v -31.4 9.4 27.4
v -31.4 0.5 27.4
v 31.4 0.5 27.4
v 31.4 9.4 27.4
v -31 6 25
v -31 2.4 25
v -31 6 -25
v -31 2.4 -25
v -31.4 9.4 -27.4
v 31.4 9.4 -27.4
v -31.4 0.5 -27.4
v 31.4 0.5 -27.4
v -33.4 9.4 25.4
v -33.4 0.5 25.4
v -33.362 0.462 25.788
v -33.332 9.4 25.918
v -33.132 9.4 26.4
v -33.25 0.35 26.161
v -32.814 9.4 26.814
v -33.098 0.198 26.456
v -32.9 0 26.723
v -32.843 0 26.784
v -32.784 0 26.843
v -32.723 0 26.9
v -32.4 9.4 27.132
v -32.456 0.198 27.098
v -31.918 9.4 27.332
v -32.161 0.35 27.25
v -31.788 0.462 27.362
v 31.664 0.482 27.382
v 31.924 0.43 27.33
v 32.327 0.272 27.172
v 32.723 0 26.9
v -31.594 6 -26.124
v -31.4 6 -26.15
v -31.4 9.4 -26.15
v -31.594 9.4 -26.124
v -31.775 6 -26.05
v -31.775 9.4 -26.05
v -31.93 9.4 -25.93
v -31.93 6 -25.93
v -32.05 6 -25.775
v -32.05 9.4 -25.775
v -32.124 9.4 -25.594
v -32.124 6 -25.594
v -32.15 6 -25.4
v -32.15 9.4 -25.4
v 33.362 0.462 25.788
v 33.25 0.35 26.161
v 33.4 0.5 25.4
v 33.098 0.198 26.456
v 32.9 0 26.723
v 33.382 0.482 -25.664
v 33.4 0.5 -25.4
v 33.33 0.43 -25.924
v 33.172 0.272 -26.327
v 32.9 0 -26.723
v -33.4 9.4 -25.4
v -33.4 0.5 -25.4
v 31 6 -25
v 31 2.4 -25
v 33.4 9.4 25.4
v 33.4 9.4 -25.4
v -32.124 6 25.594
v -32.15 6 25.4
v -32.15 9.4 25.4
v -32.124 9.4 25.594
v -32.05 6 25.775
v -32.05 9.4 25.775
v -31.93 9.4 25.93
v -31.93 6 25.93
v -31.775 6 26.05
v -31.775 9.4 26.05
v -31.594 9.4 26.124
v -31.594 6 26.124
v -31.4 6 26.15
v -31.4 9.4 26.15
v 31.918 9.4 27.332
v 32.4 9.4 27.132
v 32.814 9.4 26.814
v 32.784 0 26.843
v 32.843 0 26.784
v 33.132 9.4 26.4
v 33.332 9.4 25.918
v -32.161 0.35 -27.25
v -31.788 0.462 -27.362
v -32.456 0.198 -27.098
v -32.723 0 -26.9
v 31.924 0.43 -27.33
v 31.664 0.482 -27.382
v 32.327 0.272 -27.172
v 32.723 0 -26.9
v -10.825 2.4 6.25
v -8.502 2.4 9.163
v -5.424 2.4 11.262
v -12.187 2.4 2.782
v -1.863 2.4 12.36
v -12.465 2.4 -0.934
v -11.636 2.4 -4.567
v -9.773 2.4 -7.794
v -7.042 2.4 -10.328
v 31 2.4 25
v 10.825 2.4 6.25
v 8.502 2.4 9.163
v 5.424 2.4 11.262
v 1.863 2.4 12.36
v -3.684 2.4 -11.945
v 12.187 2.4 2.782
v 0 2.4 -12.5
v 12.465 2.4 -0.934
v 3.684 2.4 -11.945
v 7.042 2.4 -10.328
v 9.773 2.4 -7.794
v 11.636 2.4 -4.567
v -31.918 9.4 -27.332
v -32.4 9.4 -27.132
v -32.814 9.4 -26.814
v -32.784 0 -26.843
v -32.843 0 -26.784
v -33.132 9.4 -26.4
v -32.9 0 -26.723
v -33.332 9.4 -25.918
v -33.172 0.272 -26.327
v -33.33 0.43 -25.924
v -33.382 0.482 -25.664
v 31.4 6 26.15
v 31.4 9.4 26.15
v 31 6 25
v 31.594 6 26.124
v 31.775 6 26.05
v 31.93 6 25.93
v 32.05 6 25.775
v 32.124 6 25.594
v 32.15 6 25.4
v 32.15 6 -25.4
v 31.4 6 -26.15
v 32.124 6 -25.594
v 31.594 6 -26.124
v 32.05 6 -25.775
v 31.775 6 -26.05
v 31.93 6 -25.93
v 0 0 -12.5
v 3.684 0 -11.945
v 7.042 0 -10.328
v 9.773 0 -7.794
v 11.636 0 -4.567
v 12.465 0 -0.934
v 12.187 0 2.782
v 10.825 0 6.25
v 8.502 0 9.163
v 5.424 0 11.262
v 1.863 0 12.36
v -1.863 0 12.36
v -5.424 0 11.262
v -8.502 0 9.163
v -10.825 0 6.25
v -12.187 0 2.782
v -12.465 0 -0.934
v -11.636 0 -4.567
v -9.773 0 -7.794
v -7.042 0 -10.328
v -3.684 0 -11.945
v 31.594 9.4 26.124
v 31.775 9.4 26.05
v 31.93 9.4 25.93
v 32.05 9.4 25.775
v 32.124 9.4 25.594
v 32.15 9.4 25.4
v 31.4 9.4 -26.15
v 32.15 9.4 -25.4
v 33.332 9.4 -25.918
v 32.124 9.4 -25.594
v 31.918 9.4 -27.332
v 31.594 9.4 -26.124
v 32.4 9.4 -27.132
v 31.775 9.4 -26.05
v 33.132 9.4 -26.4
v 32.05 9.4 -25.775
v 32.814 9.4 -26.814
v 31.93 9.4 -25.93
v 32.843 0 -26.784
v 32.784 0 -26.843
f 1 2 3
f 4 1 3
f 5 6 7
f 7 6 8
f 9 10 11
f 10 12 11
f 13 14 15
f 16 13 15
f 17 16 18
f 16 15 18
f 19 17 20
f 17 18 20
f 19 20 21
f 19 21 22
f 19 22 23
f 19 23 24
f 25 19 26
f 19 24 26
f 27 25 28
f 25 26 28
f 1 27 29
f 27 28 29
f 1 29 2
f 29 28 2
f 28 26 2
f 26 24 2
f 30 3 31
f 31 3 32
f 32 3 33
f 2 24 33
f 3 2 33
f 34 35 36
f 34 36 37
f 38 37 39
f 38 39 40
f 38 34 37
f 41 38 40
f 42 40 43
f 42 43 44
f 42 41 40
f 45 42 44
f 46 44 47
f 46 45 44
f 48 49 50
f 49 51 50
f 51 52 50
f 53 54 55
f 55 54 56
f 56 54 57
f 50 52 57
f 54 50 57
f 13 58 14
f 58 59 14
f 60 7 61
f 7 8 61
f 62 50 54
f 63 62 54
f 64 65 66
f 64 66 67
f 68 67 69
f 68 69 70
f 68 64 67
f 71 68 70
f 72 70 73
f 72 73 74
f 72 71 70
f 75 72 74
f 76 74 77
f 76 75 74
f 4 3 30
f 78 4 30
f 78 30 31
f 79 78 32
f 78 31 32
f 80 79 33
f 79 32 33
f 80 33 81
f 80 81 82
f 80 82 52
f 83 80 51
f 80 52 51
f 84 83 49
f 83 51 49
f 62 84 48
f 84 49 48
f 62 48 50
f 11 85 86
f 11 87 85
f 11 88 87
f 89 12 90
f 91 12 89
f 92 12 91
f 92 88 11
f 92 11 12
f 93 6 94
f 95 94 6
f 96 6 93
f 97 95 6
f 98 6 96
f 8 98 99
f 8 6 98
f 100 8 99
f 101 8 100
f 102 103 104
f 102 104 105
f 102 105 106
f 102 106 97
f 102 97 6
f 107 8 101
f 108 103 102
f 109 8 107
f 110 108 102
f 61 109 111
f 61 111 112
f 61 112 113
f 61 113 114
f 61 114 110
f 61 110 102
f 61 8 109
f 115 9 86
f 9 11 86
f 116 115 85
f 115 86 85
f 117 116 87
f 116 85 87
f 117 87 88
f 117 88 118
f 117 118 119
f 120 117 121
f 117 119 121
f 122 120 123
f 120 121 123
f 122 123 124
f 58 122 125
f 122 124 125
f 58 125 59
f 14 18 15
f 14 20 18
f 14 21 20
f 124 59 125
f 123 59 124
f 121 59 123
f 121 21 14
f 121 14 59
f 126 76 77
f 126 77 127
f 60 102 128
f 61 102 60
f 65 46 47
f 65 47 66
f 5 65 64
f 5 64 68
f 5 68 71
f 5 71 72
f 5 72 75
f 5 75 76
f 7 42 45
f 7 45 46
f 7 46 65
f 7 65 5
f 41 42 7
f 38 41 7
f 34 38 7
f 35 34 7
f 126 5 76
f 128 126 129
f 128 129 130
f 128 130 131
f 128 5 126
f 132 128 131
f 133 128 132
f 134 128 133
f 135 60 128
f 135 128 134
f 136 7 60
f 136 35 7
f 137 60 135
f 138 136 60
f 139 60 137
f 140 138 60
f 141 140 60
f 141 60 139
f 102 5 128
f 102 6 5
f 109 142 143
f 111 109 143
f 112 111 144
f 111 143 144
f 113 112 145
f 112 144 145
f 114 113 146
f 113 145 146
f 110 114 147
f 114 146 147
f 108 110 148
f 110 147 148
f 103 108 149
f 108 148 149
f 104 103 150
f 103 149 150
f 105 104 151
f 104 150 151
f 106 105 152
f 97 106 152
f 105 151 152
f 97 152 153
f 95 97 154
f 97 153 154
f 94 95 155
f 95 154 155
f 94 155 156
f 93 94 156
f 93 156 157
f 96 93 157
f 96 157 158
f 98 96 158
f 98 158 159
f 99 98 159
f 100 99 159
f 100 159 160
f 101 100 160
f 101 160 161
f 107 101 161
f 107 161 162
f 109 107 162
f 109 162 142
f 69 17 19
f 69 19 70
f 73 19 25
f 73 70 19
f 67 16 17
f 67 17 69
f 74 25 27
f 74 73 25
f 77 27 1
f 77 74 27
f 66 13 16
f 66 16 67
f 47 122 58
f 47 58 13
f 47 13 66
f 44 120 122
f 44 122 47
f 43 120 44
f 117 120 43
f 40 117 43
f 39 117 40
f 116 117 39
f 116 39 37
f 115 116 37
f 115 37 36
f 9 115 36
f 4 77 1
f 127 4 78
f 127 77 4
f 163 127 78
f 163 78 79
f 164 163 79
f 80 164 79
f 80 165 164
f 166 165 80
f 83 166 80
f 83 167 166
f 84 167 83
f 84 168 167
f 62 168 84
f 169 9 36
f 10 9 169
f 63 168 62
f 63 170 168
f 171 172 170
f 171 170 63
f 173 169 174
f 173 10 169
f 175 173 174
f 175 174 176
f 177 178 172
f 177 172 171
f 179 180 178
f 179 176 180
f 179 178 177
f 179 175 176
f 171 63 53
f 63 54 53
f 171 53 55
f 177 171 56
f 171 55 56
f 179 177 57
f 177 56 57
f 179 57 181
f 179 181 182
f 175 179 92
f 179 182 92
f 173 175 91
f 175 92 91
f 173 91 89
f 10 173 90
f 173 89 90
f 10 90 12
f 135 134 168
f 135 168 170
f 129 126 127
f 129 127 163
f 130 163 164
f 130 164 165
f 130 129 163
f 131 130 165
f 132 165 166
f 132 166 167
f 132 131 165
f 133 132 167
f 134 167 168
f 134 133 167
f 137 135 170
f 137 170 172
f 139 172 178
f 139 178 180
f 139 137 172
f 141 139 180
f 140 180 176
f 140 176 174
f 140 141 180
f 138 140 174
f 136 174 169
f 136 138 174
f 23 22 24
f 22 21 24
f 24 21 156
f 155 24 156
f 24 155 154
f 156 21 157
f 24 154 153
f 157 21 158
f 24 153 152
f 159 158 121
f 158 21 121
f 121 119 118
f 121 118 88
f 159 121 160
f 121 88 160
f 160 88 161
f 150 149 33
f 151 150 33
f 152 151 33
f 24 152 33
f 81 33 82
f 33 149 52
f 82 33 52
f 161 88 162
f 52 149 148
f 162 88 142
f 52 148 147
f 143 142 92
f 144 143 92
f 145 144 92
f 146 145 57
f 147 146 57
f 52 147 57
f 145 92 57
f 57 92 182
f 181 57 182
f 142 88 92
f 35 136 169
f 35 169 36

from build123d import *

# Parameters (mm, degrees)
SKETCH1_W           = 66.8
SKETCH1_H           = 54.8
BOSS_EXTRUDE1_DEPTH = 6
CHAMFER2_SIZE       = 0.5
FILLET2_R           = 2
SHELL3_T            = -2.4
BOSS_EXTRUDE4_DEPTH = 3.4
CUT_EXTRUDE2_REACH  = 46.212
SKETCH6_R           = 12.5


with BuildPart() as part:
    # Sketch1 → Boss-Extrude1 (new body)
    with BuildSketch(Plane(origin=(0, 0, 0), x_dir=(1, 0, 0), z_dir=(0, 1, 0))):
        Rectangle(SKETCH1_W, SKETCH1_H)
    extrude(amount=BOSS_EXTRUDE1_DEPTH)

    # Chamfer2
    chamfer2_edges = [part.edges().sort_by_distance(p)[0] for p in [
        (0, 0, 27.4),
        (-33.4, 0, 0),
        (0, 0, -27.4),
        (33.4, 0, 0),
    ]]
    chamfer(chamfer2_edges, length=CHAMFER2_SIZE)

    # Fillet2
    # the kernel refuses this fillet: 2 mm, written as the material it takes off along each edge
    with BuildSketch(Plane(origin=(33.4, -4.5, 27.4), x_dir=(0, 0, -1), z_dir=(0, 1, 0)), Plane(origin=(33.4, -4.5, -27.4), x_dir=(-1, 0, 0), z_dir=(0, 1, 0))) as fillet2_piece_1:
        with BuildLine():
            CenterArc((FILLET2_R, FILLET2_R), FILLET2_R, 180, 90)
            Line((0, FILLET2_R), (0, 0))
            Line((0, 0), (FILLET2_R, 0))
        make_face()
    extrude(amount=15.5, mode=Mode.SUBTRACT)
    with BuildSketch(Plane(origin=(-33.4, -4.5, 27.4), x_dir=(0, 0, -1), z_dir=(0, 1, 0)), Plane(origin=(-33.4, -4.5, -27.4), x_dir=(1, 0, 0), z_dir=(0, 1, 0))) as fillet2_piece_2:
        with BuildLine():
            CenterArc((FILLET2_R, -FILLET2_R), FILLET2_R, 90, 90)
            Line((0, -FILLET2_R), (0, 0))
            Line((0, 0), (FILLET2_R, 0))
        make_face()
    extrude(amount=15.5, mode=Mode.SUBTRACT)

    # Shell3
    shell3_openings = [part.faces().sort_by_distance(p)[0] for p in [
        (0, 6, 0),
    ]]
    offset(amount=SHELL3_T, openings=shell3_openings, kind=Kind.INTERSECTION)

    # Sketch5 → Boss-Extrude4 (add)
    with BuildSketch(Plane(origin=(0, 6, 0), x_dir=(1, 0, 0), z_dir=(0, 1, 0))):
        with BuildLine():
            Line((33.4, -25.4), (33.4, 25.4))
            ThreePointArc((33.4, 25.4), (32.814213562, 26.814213562), (31.4, 27.4))
            Line((31.4, 27.4), (-31.4, 27.4))
            ThreePointArc((-31.4, 27.4), (-32.814213562, 26.814213562), (-33.4, 25.4))
            Line((-33.4, 25.4), (-33.4, -25.4))
            ThreePointArc((-33.4, -25.4), (-32.814213562, -26.814213562), (-31.4, -27.4))
            Line((-31.4, -27.4), (31.4, -27.4))
            ThreePointArc((31.4, -27.4), (32.814213562, -26.814213562), (33.4, -25.4))
        make_face()
        with BuildLine():
            Line((-31.4, -26.15), (31.4, -26.15))
            ThreePointArc((31.4, -26.15), (31.930330086, -25.930330086), (32.15, -25.4))
            Line((32.15, -25.4), (32.15, 25.4))
            ThreePointArc((32.15, 25.4), (31.930330086, 25.930330086), (31.4, 26.15))
            Line((31.4, 26.15), (-31.4, 26.15))
            ThreePointArc((-31.4, 26.15), (-31.930330086, 25.930330086), (-32.15, 25.4))
            Line((-32.15, 25.4), (-32.15, -25.4))
            ThreePointArc((-32.15, -25.4), (-31.930330086, -25.930330086), (-31.4, -26.15))
        make_face(mode=Mode.SUBTRACT)
    extrude(amount=BOSS_EXTRUDE4_DEPTH)

    # Sketch6 → Cut-Extrude2 (cut, up to next)
    with BuildSketch(Plane.XZ, mode=Mode.PRIVATE) as cut_extrude2_sk1:
        with Locations(Location((0, 0, 0), (0, 0, 270))):
            Circle(SKETCH6_R)
    cut_extrude2_tool1 = extrude(cut_extrude2_sk1.sketch, amount=-CUT_EXTRUDE2_REACH, mode=Mode.PRIVATE) & part.part
    add(cut_extrude2_tool1.solids().sort_by_distance((0, 0, 0))[0], mode=Mode.SUBTRACT)


solid = part.part
